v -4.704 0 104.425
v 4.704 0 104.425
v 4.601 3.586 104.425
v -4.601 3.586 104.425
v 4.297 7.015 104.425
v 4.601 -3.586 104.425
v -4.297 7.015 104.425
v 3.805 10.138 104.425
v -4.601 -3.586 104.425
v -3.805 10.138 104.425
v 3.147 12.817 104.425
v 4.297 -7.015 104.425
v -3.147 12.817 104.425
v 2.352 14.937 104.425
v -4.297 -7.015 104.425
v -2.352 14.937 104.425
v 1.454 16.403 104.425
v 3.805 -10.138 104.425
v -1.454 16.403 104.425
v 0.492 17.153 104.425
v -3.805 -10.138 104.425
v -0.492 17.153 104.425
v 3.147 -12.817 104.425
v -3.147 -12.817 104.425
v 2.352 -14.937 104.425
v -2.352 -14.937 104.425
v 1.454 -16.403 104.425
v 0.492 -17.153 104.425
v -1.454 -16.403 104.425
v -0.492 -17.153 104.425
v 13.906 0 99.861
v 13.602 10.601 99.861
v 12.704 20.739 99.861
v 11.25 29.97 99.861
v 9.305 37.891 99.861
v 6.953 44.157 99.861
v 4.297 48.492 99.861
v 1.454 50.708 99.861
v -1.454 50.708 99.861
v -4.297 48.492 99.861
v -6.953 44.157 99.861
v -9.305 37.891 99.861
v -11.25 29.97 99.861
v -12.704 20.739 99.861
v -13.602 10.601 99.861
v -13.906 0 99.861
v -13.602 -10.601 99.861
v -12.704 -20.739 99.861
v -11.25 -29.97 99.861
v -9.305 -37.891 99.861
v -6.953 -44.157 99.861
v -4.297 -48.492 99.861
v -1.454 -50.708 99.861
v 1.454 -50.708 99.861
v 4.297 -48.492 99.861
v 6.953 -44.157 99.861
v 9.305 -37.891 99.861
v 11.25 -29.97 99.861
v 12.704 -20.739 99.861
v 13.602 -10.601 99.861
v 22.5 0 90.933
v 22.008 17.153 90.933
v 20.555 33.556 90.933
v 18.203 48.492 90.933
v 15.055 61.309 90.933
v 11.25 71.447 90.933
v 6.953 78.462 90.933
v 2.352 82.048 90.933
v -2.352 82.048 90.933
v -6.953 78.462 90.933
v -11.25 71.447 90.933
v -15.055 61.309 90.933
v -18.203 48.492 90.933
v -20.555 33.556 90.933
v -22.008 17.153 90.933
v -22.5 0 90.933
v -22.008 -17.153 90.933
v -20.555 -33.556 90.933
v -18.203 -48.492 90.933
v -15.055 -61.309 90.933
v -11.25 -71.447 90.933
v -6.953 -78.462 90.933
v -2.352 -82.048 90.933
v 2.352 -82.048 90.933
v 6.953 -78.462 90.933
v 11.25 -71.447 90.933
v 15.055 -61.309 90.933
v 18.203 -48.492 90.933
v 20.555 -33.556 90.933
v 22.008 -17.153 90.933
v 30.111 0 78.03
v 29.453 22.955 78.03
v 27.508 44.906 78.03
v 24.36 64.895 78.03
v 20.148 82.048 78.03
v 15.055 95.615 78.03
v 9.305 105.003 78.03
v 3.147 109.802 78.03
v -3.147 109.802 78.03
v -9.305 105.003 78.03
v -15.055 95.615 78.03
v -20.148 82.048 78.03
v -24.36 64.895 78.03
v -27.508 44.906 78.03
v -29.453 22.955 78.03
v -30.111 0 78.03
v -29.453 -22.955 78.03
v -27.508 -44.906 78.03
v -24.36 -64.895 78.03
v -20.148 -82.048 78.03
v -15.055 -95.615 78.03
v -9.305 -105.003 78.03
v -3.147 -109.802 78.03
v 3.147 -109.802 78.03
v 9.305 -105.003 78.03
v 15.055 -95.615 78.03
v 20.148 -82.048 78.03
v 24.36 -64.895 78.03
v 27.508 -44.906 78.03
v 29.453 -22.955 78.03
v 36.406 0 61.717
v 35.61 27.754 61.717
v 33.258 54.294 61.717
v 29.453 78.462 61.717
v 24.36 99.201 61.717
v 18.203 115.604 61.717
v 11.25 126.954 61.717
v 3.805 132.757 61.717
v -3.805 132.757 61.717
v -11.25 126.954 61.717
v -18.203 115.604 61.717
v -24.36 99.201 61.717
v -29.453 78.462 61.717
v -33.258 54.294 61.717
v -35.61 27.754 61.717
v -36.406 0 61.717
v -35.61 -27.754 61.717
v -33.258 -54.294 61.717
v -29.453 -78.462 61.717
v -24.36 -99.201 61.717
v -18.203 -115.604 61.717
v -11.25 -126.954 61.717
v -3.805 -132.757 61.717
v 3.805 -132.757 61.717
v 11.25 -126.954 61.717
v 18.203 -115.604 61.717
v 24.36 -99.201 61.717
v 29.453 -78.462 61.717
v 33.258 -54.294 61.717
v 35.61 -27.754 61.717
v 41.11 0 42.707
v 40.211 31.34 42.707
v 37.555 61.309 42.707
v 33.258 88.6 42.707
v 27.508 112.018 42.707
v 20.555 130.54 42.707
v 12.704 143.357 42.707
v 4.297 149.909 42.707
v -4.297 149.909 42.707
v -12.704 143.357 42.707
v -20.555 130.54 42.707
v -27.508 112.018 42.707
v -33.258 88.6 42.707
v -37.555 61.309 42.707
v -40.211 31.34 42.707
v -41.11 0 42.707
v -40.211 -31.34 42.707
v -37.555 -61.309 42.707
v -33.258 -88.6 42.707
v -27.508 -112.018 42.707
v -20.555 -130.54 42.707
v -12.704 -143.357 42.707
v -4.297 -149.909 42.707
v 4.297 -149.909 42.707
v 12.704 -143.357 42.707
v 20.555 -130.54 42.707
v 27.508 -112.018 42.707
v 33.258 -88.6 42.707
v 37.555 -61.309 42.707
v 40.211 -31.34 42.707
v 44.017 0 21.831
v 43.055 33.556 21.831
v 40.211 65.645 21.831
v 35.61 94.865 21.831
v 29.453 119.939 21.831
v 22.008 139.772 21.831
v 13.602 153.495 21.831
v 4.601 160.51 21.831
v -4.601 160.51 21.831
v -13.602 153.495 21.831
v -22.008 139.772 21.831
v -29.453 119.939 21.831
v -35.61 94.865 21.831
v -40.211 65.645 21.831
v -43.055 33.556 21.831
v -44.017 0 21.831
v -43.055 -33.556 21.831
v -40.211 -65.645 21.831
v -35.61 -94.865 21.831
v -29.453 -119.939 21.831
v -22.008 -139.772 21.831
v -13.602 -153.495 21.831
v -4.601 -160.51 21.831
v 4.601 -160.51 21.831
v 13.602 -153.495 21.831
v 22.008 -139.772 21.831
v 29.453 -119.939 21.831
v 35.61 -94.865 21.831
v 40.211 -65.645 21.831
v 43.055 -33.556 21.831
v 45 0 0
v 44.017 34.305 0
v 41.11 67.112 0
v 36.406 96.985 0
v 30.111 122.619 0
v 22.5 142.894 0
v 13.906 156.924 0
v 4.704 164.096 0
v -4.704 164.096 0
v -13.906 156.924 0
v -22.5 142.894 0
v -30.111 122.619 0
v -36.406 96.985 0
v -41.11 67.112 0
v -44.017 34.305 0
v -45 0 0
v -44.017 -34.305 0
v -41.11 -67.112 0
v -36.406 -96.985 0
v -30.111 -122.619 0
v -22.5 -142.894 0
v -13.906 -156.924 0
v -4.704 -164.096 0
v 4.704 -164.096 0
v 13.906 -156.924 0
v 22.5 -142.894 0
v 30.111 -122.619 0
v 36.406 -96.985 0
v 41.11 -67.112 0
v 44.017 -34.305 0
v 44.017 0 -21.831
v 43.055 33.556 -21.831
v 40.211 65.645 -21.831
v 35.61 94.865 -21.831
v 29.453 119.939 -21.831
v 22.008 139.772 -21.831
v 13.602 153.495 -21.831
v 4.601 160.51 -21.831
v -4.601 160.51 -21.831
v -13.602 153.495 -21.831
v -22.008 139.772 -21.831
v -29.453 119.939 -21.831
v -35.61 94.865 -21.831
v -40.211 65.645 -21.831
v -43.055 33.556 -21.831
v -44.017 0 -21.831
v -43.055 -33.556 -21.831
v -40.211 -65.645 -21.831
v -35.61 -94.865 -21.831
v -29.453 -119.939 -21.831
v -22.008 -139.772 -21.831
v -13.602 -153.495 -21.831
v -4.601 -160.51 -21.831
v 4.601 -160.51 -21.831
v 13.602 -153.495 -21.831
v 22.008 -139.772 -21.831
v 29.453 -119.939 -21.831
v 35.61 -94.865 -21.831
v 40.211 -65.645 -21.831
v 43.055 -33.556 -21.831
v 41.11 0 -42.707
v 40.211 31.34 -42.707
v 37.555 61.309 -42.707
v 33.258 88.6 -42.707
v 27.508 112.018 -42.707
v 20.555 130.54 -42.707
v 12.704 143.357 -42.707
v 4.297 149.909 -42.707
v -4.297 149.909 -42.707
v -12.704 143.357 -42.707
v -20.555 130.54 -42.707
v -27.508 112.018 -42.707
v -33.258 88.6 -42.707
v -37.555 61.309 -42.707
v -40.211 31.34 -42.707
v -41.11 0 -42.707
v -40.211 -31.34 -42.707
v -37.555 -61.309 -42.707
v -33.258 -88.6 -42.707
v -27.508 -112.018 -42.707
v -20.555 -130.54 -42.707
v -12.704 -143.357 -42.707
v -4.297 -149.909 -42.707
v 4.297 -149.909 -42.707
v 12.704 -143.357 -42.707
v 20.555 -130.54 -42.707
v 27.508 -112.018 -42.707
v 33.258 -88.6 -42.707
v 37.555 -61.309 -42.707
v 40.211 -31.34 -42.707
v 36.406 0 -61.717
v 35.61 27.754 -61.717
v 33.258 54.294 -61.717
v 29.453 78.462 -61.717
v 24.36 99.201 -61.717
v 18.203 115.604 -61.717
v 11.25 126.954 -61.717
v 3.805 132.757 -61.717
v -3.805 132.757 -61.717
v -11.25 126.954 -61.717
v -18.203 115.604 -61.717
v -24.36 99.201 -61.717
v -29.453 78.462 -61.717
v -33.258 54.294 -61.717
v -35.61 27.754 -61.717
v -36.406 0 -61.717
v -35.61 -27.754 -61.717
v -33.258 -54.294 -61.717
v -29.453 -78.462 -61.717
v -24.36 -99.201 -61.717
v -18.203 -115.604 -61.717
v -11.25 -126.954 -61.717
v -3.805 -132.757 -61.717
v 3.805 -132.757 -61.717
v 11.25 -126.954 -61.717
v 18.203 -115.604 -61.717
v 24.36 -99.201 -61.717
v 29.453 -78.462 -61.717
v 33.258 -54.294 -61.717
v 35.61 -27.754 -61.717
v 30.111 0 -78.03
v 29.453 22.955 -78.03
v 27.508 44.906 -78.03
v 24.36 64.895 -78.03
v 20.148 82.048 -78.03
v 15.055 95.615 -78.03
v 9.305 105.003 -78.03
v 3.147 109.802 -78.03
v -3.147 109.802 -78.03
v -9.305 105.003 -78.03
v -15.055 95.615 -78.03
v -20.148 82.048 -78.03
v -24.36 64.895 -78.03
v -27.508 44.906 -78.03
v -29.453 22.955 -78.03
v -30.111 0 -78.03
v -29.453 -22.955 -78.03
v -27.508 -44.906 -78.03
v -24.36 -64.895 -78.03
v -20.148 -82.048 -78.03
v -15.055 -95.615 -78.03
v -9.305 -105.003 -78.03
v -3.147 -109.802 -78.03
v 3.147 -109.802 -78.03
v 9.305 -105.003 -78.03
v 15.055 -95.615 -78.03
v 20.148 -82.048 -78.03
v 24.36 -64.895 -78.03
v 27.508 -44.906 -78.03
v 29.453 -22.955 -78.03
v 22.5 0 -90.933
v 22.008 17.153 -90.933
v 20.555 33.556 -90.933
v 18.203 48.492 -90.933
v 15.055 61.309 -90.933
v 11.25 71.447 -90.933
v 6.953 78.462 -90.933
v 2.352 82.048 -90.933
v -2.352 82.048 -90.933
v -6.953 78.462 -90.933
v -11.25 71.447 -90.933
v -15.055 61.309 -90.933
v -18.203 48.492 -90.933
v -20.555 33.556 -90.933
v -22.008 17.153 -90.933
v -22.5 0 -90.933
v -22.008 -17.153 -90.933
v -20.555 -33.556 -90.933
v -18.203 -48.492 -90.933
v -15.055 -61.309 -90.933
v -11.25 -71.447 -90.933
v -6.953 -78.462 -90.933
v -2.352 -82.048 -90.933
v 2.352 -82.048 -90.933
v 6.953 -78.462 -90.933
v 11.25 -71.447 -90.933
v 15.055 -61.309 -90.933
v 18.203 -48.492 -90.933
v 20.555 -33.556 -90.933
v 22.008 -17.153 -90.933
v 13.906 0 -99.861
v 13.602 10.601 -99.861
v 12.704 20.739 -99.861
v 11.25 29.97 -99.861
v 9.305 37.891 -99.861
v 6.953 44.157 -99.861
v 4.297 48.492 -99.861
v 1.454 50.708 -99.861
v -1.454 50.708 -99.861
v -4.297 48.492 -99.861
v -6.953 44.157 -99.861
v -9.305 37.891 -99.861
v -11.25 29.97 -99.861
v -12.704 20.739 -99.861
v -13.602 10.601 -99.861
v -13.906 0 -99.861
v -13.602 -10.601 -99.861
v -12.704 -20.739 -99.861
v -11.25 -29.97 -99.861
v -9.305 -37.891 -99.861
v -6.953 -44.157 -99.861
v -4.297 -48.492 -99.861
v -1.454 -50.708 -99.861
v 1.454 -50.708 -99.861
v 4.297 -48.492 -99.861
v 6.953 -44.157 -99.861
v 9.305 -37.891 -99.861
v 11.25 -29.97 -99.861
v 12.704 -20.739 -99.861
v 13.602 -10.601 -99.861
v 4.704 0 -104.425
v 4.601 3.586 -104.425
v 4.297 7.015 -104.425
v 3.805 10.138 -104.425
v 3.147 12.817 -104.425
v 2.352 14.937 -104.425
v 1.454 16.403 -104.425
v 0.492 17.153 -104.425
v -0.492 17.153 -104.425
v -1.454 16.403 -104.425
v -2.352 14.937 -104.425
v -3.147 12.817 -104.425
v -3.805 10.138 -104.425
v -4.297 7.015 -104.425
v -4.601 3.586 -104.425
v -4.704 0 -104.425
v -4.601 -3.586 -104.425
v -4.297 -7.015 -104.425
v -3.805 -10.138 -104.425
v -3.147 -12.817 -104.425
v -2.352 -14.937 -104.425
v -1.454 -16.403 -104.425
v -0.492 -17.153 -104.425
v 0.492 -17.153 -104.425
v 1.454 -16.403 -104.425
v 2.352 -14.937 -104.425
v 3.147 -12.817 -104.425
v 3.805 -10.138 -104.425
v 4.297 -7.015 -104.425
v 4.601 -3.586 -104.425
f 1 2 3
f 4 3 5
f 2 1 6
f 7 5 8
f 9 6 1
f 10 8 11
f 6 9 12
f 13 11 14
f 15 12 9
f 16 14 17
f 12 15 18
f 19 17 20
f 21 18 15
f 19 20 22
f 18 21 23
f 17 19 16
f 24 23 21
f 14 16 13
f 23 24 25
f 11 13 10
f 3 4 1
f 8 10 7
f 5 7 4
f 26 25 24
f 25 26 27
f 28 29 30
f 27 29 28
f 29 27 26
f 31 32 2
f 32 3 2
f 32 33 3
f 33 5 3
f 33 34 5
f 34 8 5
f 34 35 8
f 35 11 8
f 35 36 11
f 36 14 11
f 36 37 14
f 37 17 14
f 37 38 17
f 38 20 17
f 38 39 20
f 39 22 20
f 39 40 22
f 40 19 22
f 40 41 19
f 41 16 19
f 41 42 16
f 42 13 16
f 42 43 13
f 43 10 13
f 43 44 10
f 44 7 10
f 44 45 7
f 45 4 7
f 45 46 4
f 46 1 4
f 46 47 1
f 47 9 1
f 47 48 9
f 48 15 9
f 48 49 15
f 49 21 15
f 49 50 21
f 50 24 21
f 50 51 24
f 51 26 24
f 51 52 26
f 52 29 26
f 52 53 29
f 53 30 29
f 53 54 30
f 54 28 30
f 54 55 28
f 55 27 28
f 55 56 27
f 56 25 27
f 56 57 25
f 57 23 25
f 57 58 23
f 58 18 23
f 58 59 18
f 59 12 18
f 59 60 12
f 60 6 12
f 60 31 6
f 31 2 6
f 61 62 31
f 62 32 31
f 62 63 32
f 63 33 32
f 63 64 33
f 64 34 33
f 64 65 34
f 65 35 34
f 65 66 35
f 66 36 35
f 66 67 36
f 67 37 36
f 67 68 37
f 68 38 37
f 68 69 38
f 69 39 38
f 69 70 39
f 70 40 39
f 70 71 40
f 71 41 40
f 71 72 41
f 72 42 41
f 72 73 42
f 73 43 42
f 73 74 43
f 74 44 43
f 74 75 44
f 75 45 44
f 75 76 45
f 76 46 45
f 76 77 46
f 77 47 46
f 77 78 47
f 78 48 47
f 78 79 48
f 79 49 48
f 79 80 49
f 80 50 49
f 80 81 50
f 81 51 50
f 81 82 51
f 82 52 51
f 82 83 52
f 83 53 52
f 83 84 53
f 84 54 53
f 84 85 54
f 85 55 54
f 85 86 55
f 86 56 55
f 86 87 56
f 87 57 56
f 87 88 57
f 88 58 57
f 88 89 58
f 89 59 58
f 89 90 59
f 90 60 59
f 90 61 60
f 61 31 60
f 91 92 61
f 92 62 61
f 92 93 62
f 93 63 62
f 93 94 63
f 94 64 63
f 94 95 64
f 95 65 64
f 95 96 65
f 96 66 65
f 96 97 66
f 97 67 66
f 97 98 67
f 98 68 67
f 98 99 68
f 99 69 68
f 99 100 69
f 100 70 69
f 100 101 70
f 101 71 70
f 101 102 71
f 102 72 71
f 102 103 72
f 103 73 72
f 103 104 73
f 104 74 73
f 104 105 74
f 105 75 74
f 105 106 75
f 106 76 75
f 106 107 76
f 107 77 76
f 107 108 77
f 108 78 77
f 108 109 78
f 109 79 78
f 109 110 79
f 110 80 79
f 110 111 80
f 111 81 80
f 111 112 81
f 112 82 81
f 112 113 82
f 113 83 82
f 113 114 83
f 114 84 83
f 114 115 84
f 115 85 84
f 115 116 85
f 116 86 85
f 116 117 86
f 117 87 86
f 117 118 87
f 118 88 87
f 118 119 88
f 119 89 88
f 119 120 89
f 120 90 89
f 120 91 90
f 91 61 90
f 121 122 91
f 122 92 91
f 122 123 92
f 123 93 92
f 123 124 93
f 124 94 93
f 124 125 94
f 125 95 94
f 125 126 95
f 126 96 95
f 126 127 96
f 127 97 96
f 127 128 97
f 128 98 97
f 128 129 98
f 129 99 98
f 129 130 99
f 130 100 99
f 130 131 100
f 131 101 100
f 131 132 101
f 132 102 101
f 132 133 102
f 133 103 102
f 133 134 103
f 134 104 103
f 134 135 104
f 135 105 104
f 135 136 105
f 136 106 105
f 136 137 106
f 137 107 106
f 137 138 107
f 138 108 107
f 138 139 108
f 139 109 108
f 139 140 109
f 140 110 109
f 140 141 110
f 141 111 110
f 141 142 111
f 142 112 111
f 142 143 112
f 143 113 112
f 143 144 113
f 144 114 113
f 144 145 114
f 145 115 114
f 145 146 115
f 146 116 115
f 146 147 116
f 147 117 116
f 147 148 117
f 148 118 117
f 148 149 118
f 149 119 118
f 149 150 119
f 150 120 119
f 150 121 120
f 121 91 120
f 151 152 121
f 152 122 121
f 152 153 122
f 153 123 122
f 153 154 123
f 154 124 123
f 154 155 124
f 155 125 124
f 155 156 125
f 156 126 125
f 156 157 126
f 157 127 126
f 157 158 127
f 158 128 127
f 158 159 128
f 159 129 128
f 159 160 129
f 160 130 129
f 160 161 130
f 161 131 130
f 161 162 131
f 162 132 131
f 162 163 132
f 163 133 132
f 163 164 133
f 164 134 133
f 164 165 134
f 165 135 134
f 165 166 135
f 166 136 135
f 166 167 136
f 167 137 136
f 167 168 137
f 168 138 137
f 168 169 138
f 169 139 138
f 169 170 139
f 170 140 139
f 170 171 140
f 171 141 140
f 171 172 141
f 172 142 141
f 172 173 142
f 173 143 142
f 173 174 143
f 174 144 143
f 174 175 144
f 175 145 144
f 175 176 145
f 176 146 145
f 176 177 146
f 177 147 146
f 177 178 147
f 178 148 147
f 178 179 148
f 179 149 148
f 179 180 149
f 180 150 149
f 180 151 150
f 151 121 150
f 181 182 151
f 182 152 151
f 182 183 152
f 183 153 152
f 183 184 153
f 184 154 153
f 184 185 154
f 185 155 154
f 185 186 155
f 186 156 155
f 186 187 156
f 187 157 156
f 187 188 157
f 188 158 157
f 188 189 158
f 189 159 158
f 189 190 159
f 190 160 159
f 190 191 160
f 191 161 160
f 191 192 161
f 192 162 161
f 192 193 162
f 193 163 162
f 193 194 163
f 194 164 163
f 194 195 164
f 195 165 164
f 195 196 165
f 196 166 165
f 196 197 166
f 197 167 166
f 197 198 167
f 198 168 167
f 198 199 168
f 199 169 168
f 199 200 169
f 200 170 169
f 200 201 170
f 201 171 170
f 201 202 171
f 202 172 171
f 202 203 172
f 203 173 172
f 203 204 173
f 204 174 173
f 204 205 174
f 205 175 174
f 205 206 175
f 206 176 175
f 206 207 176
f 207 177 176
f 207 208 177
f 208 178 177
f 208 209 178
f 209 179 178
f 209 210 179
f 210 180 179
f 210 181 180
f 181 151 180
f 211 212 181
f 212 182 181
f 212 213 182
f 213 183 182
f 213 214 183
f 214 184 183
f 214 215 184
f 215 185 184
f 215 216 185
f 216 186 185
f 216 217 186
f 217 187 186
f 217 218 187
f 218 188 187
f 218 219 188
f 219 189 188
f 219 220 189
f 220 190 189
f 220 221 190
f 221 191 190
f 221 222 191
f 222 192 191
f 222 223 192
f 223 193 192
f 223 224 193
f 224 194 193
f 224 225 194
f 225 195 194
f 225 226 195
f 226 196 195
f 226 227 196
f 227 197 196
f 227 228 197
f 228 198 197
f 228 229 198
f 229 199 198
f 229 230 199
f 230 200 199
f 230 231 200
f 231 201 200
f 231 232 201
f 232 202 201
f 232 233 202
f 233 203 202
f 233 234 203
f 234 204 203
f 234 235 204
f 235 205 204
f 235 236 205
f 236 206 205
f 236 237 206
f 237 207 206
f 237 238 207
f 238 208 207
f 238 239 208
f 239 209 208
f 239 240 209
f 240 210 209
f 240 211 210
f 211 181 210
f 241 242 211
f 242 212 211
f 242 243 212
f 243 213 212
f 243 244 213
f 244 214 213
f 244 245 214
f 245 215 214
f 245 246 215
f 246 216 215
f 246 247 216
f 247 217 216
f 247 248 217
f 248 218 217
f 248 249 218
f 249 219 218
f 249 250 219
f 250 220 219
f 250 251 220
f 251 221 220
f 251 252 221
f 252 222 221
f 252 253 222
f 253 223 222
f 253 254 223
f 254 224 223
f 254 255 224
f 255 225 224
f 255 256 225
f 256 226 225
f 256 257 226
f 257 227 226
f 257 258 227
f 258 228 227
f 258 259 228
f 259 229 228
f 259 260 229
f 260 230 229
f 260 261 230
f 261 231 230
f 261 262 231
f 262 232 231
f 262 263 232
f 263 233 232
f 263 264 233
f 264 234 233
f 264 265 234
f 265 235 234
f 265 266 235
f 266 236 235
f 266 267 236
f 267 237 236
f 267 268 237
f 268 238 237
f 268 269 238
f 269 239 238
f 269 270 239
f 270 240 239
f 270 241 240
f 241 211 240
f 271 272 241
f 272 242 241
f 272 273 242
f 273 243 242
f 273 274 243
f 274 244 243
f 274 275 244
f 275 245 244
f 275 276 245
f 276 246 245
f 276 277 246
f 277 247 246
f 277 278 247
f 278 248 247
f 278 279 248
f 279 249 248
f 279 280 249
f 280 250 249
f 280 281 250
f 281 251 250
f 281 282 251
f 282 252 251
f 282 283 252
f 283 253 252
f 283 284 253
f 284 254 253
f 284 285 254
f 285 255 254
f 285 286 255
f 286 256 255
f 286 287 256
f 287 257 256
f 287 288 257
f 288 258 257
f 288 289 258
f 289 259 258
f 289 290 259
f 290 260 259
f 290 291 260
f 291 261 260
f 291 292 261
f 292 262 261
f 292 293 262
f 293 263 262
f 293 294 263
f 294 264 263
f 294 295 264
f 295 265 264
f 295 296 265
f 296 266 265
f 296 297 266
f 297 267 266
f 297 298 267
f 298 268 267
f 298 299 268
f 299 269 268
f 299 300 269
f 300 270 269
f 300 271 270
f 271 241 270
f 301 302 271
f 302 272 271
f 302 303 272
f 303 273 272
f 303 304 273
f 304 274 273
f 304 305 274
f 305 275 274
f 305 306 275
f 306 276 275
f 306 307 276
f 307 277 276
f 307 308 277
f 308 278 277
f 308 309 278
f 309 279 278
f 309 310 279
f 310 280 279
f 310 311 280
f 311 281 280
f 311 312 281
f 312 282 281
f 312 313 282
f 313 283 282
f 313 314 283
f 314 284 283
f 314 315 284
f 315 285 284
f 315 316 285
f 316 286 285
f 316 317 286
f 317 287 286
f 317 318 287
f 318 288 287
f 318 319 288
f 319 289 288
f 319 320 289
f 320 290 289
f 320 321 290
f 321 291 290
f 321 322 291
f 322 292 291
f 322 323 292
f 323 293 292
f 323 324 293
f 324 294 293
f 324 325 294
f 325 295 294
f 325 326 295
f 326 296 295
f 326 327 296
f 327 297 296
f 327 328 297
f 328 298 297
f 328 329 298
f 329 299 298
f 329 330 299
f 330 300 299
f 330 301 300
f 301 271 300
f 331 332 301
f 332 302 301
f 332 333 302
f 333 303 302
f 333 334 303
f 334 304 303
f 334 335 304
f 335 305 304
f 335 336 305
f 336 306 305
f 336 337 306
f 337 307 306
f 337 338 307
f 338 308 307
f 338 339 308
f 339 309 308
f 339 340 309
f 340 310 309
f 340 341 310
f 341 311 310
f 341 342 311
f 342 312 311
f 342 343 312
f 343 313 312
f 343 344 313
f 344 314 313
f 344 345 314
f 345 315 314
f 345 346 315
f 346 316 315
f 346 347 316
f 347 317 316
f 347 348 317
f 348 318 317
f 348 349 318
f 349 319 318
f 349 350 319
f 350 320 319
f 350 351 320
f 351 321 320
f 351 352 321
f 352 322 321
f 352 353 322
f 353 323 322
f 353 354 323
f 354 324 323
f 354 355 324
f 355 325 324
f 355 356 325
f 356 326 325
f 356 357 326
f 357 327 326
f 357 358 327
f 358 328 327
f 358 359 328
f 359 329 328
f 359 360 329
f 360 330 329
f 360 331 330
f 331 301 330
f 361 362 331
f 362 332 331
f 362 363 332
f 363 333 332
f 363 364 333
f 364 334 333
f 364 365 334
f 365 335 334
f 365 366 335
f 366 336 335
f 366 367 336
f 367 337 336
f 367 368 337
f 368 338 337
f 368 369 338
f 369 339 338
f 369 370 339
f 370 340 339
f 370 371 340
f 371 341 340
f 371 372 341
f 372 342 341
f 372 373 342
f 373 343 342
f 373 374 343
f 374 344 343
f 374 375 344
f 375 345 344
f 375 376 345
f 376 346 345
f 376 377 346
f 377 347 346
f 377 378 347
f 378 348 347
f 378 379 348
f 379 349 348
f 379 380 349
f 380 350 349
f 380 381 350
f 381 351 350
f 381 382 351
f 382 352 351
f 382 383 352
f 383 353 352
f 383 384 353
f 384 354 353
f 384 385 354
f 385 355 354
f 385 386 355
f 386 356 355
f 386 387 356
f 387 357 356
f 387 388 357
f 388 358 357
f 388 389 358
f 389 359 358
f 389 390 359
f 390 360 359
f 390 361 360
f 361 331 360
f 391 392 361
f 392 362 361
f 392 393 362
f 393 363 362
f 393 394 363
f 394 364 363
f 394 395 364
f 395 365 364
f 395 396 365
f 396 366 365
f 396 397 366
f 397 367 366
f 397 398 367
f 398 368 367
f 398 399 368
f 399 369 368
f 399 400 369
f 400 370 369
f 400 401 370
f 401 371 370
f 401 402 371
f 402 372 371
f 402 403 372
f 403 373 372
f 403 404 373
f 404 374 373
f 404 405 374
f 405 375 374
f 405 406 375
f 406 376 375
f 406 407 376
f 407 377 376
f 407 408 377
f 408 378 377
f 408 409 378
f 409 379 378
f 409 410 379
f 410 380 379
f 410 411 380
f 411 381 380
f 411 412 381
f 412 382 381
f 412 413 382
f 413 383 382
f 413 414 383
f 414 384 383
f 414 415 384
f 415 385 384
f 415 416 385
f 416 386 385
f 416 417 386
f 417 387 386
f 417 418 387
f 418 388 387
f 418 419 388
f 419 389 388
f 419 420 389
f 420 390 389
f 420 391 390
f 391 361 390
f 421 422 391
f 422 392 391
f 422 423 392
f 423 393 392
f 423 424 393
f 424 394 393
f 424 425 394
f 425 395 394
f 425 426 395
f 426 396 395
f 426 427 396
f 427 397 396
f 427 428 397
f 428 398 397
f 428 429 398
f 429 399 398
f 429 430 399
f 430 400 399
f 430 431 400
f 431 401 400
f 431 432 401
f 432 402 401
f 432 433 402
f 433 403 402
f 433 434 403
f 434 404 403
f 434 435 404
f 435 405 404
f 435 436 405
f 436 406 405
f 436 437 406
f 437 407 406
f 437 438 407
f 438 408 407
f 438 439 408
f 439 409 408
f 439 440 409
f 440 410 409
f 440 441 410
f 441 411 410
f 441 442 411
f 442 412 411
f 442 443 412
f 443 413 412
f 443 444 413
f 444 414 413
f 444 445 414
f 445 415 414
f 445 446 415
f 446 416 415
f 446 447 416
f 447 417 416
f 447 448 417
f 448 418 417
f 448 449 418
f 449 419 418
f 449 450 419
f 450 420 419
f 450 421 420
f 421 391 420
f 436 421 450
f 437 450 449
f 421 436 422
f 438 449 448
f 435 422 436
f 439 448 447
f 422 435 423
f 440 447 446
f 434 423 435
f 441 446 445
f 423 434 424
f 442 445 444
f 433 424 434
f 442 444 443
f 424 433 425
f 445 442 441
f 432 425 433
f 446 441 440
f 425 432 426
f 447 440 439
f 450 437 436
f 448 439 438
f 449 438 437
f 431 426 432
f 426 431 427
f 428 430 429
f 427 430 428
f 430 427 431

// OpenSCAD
// Generated by SolidPython 1.0.1 on 2020-07-29 00:46:45


scale(v = [3, 11, 7]) {
	sphere(r = 15);
}
/***********************************************
*********      SolidPython code:      **********
************************************************
 
# import packages: SolidPython
from solid import *
from solid.utils import *
from itertools import chain, combinations, permutations


class Resize:

    def __init__(self, scad_file):
        self.scad_file = scad_file
        #self.scad_file = import_scad(scad_file)
        # cone/cylinder param:
        self.r1 = 0
        self.r2 = 0
        self.h = 0
        # rectangular prism param:
        self.w = 0
        self.l = 0
        # ellipse param:
        self.r = 0

    # import OpenScad code (file name corresponds to shape)


    # classify shape + parameters
    def assign(self, param1, param2, param3):
        if self.scad_file == 'cone.scad':
            self.r1 = param1
            self.r2 = param2
            self.h = param3
        elif self.scad_file == 'cylinder.scad':
            self.r1 = param1
            self.r2 = param2
            self.h = param3
        elif self.scad_file == 'rectangularPrism.scad':
            self.h = param1
            self.l = param2
            self.w = param3
        else:
            self.r = param1
            self.h = param2

    # resize parameters
    def iterate(self):
        x = range(3, 20, 2)
        i = 1
        if self.scad_file == 'cone.scad':
            tempList = list(permutations(x, 2))
            for temp in tempList:
                param1 = temp[0]
                param2 = temp[1]
                filepath = 'produced_scad_files/' + 'cone' + str(param1) + '_' + str(param2) + '_' + '.scad'
                scad_render_to_file(cylinder(h=param1, r1=param2, r2=0), filepath)

        elif self.scad_file == 'cylinder.scad':
            tempList = list(permutations(x, 3))
            for temp in tempList:
                param1 = temp[0]
                param2 = temp[1]
                filepath = 'produced_scad_files/' + 'cylinder' + str(param1) + '_' + str(param2) + '_' + '.scad'
                scad_render_to_file(cylinder(h=param1, r1=param2, r2=param2), filepath)

        elif self.scad_file == 'rectangularPrism.scad':
            tempList = list(permutations(x, 3))
            for temp in tempList:
                param1 = temp[0]
                param2 = temp[1]
                param3 = temp[2]
                filepath = 'produced_scad_files/' + 'rectangularPrism' + str(param1) + '_' + str(param2) + '_' + str(
                    param3) + '.scad'
                scad_render_to_file(cube(size=(param1, param2, param3)), filepath)

        elif self.scad_file == 'ellipse.scad':
            tempList = list(permutations(x, 4))
            for temp in tempList:
                param1 = temp[0]
                param2 = temp[1]
                param3 = temp[2]
                param4 = temp[3]
                filepath = 'produced_scad_files/' + 'ellipse' + str(param1) + '_' + str(param2) + '_' + str(param3) + '_' + str(param4) + '.scad'
                scad_render_to_file(scale([param1, param2, param3])(sphere(r=param4)), filepath)

    def render_to_scadfile(self):
        scad_render_to_file(scad, 'example.scad') 
 
************************************************/
